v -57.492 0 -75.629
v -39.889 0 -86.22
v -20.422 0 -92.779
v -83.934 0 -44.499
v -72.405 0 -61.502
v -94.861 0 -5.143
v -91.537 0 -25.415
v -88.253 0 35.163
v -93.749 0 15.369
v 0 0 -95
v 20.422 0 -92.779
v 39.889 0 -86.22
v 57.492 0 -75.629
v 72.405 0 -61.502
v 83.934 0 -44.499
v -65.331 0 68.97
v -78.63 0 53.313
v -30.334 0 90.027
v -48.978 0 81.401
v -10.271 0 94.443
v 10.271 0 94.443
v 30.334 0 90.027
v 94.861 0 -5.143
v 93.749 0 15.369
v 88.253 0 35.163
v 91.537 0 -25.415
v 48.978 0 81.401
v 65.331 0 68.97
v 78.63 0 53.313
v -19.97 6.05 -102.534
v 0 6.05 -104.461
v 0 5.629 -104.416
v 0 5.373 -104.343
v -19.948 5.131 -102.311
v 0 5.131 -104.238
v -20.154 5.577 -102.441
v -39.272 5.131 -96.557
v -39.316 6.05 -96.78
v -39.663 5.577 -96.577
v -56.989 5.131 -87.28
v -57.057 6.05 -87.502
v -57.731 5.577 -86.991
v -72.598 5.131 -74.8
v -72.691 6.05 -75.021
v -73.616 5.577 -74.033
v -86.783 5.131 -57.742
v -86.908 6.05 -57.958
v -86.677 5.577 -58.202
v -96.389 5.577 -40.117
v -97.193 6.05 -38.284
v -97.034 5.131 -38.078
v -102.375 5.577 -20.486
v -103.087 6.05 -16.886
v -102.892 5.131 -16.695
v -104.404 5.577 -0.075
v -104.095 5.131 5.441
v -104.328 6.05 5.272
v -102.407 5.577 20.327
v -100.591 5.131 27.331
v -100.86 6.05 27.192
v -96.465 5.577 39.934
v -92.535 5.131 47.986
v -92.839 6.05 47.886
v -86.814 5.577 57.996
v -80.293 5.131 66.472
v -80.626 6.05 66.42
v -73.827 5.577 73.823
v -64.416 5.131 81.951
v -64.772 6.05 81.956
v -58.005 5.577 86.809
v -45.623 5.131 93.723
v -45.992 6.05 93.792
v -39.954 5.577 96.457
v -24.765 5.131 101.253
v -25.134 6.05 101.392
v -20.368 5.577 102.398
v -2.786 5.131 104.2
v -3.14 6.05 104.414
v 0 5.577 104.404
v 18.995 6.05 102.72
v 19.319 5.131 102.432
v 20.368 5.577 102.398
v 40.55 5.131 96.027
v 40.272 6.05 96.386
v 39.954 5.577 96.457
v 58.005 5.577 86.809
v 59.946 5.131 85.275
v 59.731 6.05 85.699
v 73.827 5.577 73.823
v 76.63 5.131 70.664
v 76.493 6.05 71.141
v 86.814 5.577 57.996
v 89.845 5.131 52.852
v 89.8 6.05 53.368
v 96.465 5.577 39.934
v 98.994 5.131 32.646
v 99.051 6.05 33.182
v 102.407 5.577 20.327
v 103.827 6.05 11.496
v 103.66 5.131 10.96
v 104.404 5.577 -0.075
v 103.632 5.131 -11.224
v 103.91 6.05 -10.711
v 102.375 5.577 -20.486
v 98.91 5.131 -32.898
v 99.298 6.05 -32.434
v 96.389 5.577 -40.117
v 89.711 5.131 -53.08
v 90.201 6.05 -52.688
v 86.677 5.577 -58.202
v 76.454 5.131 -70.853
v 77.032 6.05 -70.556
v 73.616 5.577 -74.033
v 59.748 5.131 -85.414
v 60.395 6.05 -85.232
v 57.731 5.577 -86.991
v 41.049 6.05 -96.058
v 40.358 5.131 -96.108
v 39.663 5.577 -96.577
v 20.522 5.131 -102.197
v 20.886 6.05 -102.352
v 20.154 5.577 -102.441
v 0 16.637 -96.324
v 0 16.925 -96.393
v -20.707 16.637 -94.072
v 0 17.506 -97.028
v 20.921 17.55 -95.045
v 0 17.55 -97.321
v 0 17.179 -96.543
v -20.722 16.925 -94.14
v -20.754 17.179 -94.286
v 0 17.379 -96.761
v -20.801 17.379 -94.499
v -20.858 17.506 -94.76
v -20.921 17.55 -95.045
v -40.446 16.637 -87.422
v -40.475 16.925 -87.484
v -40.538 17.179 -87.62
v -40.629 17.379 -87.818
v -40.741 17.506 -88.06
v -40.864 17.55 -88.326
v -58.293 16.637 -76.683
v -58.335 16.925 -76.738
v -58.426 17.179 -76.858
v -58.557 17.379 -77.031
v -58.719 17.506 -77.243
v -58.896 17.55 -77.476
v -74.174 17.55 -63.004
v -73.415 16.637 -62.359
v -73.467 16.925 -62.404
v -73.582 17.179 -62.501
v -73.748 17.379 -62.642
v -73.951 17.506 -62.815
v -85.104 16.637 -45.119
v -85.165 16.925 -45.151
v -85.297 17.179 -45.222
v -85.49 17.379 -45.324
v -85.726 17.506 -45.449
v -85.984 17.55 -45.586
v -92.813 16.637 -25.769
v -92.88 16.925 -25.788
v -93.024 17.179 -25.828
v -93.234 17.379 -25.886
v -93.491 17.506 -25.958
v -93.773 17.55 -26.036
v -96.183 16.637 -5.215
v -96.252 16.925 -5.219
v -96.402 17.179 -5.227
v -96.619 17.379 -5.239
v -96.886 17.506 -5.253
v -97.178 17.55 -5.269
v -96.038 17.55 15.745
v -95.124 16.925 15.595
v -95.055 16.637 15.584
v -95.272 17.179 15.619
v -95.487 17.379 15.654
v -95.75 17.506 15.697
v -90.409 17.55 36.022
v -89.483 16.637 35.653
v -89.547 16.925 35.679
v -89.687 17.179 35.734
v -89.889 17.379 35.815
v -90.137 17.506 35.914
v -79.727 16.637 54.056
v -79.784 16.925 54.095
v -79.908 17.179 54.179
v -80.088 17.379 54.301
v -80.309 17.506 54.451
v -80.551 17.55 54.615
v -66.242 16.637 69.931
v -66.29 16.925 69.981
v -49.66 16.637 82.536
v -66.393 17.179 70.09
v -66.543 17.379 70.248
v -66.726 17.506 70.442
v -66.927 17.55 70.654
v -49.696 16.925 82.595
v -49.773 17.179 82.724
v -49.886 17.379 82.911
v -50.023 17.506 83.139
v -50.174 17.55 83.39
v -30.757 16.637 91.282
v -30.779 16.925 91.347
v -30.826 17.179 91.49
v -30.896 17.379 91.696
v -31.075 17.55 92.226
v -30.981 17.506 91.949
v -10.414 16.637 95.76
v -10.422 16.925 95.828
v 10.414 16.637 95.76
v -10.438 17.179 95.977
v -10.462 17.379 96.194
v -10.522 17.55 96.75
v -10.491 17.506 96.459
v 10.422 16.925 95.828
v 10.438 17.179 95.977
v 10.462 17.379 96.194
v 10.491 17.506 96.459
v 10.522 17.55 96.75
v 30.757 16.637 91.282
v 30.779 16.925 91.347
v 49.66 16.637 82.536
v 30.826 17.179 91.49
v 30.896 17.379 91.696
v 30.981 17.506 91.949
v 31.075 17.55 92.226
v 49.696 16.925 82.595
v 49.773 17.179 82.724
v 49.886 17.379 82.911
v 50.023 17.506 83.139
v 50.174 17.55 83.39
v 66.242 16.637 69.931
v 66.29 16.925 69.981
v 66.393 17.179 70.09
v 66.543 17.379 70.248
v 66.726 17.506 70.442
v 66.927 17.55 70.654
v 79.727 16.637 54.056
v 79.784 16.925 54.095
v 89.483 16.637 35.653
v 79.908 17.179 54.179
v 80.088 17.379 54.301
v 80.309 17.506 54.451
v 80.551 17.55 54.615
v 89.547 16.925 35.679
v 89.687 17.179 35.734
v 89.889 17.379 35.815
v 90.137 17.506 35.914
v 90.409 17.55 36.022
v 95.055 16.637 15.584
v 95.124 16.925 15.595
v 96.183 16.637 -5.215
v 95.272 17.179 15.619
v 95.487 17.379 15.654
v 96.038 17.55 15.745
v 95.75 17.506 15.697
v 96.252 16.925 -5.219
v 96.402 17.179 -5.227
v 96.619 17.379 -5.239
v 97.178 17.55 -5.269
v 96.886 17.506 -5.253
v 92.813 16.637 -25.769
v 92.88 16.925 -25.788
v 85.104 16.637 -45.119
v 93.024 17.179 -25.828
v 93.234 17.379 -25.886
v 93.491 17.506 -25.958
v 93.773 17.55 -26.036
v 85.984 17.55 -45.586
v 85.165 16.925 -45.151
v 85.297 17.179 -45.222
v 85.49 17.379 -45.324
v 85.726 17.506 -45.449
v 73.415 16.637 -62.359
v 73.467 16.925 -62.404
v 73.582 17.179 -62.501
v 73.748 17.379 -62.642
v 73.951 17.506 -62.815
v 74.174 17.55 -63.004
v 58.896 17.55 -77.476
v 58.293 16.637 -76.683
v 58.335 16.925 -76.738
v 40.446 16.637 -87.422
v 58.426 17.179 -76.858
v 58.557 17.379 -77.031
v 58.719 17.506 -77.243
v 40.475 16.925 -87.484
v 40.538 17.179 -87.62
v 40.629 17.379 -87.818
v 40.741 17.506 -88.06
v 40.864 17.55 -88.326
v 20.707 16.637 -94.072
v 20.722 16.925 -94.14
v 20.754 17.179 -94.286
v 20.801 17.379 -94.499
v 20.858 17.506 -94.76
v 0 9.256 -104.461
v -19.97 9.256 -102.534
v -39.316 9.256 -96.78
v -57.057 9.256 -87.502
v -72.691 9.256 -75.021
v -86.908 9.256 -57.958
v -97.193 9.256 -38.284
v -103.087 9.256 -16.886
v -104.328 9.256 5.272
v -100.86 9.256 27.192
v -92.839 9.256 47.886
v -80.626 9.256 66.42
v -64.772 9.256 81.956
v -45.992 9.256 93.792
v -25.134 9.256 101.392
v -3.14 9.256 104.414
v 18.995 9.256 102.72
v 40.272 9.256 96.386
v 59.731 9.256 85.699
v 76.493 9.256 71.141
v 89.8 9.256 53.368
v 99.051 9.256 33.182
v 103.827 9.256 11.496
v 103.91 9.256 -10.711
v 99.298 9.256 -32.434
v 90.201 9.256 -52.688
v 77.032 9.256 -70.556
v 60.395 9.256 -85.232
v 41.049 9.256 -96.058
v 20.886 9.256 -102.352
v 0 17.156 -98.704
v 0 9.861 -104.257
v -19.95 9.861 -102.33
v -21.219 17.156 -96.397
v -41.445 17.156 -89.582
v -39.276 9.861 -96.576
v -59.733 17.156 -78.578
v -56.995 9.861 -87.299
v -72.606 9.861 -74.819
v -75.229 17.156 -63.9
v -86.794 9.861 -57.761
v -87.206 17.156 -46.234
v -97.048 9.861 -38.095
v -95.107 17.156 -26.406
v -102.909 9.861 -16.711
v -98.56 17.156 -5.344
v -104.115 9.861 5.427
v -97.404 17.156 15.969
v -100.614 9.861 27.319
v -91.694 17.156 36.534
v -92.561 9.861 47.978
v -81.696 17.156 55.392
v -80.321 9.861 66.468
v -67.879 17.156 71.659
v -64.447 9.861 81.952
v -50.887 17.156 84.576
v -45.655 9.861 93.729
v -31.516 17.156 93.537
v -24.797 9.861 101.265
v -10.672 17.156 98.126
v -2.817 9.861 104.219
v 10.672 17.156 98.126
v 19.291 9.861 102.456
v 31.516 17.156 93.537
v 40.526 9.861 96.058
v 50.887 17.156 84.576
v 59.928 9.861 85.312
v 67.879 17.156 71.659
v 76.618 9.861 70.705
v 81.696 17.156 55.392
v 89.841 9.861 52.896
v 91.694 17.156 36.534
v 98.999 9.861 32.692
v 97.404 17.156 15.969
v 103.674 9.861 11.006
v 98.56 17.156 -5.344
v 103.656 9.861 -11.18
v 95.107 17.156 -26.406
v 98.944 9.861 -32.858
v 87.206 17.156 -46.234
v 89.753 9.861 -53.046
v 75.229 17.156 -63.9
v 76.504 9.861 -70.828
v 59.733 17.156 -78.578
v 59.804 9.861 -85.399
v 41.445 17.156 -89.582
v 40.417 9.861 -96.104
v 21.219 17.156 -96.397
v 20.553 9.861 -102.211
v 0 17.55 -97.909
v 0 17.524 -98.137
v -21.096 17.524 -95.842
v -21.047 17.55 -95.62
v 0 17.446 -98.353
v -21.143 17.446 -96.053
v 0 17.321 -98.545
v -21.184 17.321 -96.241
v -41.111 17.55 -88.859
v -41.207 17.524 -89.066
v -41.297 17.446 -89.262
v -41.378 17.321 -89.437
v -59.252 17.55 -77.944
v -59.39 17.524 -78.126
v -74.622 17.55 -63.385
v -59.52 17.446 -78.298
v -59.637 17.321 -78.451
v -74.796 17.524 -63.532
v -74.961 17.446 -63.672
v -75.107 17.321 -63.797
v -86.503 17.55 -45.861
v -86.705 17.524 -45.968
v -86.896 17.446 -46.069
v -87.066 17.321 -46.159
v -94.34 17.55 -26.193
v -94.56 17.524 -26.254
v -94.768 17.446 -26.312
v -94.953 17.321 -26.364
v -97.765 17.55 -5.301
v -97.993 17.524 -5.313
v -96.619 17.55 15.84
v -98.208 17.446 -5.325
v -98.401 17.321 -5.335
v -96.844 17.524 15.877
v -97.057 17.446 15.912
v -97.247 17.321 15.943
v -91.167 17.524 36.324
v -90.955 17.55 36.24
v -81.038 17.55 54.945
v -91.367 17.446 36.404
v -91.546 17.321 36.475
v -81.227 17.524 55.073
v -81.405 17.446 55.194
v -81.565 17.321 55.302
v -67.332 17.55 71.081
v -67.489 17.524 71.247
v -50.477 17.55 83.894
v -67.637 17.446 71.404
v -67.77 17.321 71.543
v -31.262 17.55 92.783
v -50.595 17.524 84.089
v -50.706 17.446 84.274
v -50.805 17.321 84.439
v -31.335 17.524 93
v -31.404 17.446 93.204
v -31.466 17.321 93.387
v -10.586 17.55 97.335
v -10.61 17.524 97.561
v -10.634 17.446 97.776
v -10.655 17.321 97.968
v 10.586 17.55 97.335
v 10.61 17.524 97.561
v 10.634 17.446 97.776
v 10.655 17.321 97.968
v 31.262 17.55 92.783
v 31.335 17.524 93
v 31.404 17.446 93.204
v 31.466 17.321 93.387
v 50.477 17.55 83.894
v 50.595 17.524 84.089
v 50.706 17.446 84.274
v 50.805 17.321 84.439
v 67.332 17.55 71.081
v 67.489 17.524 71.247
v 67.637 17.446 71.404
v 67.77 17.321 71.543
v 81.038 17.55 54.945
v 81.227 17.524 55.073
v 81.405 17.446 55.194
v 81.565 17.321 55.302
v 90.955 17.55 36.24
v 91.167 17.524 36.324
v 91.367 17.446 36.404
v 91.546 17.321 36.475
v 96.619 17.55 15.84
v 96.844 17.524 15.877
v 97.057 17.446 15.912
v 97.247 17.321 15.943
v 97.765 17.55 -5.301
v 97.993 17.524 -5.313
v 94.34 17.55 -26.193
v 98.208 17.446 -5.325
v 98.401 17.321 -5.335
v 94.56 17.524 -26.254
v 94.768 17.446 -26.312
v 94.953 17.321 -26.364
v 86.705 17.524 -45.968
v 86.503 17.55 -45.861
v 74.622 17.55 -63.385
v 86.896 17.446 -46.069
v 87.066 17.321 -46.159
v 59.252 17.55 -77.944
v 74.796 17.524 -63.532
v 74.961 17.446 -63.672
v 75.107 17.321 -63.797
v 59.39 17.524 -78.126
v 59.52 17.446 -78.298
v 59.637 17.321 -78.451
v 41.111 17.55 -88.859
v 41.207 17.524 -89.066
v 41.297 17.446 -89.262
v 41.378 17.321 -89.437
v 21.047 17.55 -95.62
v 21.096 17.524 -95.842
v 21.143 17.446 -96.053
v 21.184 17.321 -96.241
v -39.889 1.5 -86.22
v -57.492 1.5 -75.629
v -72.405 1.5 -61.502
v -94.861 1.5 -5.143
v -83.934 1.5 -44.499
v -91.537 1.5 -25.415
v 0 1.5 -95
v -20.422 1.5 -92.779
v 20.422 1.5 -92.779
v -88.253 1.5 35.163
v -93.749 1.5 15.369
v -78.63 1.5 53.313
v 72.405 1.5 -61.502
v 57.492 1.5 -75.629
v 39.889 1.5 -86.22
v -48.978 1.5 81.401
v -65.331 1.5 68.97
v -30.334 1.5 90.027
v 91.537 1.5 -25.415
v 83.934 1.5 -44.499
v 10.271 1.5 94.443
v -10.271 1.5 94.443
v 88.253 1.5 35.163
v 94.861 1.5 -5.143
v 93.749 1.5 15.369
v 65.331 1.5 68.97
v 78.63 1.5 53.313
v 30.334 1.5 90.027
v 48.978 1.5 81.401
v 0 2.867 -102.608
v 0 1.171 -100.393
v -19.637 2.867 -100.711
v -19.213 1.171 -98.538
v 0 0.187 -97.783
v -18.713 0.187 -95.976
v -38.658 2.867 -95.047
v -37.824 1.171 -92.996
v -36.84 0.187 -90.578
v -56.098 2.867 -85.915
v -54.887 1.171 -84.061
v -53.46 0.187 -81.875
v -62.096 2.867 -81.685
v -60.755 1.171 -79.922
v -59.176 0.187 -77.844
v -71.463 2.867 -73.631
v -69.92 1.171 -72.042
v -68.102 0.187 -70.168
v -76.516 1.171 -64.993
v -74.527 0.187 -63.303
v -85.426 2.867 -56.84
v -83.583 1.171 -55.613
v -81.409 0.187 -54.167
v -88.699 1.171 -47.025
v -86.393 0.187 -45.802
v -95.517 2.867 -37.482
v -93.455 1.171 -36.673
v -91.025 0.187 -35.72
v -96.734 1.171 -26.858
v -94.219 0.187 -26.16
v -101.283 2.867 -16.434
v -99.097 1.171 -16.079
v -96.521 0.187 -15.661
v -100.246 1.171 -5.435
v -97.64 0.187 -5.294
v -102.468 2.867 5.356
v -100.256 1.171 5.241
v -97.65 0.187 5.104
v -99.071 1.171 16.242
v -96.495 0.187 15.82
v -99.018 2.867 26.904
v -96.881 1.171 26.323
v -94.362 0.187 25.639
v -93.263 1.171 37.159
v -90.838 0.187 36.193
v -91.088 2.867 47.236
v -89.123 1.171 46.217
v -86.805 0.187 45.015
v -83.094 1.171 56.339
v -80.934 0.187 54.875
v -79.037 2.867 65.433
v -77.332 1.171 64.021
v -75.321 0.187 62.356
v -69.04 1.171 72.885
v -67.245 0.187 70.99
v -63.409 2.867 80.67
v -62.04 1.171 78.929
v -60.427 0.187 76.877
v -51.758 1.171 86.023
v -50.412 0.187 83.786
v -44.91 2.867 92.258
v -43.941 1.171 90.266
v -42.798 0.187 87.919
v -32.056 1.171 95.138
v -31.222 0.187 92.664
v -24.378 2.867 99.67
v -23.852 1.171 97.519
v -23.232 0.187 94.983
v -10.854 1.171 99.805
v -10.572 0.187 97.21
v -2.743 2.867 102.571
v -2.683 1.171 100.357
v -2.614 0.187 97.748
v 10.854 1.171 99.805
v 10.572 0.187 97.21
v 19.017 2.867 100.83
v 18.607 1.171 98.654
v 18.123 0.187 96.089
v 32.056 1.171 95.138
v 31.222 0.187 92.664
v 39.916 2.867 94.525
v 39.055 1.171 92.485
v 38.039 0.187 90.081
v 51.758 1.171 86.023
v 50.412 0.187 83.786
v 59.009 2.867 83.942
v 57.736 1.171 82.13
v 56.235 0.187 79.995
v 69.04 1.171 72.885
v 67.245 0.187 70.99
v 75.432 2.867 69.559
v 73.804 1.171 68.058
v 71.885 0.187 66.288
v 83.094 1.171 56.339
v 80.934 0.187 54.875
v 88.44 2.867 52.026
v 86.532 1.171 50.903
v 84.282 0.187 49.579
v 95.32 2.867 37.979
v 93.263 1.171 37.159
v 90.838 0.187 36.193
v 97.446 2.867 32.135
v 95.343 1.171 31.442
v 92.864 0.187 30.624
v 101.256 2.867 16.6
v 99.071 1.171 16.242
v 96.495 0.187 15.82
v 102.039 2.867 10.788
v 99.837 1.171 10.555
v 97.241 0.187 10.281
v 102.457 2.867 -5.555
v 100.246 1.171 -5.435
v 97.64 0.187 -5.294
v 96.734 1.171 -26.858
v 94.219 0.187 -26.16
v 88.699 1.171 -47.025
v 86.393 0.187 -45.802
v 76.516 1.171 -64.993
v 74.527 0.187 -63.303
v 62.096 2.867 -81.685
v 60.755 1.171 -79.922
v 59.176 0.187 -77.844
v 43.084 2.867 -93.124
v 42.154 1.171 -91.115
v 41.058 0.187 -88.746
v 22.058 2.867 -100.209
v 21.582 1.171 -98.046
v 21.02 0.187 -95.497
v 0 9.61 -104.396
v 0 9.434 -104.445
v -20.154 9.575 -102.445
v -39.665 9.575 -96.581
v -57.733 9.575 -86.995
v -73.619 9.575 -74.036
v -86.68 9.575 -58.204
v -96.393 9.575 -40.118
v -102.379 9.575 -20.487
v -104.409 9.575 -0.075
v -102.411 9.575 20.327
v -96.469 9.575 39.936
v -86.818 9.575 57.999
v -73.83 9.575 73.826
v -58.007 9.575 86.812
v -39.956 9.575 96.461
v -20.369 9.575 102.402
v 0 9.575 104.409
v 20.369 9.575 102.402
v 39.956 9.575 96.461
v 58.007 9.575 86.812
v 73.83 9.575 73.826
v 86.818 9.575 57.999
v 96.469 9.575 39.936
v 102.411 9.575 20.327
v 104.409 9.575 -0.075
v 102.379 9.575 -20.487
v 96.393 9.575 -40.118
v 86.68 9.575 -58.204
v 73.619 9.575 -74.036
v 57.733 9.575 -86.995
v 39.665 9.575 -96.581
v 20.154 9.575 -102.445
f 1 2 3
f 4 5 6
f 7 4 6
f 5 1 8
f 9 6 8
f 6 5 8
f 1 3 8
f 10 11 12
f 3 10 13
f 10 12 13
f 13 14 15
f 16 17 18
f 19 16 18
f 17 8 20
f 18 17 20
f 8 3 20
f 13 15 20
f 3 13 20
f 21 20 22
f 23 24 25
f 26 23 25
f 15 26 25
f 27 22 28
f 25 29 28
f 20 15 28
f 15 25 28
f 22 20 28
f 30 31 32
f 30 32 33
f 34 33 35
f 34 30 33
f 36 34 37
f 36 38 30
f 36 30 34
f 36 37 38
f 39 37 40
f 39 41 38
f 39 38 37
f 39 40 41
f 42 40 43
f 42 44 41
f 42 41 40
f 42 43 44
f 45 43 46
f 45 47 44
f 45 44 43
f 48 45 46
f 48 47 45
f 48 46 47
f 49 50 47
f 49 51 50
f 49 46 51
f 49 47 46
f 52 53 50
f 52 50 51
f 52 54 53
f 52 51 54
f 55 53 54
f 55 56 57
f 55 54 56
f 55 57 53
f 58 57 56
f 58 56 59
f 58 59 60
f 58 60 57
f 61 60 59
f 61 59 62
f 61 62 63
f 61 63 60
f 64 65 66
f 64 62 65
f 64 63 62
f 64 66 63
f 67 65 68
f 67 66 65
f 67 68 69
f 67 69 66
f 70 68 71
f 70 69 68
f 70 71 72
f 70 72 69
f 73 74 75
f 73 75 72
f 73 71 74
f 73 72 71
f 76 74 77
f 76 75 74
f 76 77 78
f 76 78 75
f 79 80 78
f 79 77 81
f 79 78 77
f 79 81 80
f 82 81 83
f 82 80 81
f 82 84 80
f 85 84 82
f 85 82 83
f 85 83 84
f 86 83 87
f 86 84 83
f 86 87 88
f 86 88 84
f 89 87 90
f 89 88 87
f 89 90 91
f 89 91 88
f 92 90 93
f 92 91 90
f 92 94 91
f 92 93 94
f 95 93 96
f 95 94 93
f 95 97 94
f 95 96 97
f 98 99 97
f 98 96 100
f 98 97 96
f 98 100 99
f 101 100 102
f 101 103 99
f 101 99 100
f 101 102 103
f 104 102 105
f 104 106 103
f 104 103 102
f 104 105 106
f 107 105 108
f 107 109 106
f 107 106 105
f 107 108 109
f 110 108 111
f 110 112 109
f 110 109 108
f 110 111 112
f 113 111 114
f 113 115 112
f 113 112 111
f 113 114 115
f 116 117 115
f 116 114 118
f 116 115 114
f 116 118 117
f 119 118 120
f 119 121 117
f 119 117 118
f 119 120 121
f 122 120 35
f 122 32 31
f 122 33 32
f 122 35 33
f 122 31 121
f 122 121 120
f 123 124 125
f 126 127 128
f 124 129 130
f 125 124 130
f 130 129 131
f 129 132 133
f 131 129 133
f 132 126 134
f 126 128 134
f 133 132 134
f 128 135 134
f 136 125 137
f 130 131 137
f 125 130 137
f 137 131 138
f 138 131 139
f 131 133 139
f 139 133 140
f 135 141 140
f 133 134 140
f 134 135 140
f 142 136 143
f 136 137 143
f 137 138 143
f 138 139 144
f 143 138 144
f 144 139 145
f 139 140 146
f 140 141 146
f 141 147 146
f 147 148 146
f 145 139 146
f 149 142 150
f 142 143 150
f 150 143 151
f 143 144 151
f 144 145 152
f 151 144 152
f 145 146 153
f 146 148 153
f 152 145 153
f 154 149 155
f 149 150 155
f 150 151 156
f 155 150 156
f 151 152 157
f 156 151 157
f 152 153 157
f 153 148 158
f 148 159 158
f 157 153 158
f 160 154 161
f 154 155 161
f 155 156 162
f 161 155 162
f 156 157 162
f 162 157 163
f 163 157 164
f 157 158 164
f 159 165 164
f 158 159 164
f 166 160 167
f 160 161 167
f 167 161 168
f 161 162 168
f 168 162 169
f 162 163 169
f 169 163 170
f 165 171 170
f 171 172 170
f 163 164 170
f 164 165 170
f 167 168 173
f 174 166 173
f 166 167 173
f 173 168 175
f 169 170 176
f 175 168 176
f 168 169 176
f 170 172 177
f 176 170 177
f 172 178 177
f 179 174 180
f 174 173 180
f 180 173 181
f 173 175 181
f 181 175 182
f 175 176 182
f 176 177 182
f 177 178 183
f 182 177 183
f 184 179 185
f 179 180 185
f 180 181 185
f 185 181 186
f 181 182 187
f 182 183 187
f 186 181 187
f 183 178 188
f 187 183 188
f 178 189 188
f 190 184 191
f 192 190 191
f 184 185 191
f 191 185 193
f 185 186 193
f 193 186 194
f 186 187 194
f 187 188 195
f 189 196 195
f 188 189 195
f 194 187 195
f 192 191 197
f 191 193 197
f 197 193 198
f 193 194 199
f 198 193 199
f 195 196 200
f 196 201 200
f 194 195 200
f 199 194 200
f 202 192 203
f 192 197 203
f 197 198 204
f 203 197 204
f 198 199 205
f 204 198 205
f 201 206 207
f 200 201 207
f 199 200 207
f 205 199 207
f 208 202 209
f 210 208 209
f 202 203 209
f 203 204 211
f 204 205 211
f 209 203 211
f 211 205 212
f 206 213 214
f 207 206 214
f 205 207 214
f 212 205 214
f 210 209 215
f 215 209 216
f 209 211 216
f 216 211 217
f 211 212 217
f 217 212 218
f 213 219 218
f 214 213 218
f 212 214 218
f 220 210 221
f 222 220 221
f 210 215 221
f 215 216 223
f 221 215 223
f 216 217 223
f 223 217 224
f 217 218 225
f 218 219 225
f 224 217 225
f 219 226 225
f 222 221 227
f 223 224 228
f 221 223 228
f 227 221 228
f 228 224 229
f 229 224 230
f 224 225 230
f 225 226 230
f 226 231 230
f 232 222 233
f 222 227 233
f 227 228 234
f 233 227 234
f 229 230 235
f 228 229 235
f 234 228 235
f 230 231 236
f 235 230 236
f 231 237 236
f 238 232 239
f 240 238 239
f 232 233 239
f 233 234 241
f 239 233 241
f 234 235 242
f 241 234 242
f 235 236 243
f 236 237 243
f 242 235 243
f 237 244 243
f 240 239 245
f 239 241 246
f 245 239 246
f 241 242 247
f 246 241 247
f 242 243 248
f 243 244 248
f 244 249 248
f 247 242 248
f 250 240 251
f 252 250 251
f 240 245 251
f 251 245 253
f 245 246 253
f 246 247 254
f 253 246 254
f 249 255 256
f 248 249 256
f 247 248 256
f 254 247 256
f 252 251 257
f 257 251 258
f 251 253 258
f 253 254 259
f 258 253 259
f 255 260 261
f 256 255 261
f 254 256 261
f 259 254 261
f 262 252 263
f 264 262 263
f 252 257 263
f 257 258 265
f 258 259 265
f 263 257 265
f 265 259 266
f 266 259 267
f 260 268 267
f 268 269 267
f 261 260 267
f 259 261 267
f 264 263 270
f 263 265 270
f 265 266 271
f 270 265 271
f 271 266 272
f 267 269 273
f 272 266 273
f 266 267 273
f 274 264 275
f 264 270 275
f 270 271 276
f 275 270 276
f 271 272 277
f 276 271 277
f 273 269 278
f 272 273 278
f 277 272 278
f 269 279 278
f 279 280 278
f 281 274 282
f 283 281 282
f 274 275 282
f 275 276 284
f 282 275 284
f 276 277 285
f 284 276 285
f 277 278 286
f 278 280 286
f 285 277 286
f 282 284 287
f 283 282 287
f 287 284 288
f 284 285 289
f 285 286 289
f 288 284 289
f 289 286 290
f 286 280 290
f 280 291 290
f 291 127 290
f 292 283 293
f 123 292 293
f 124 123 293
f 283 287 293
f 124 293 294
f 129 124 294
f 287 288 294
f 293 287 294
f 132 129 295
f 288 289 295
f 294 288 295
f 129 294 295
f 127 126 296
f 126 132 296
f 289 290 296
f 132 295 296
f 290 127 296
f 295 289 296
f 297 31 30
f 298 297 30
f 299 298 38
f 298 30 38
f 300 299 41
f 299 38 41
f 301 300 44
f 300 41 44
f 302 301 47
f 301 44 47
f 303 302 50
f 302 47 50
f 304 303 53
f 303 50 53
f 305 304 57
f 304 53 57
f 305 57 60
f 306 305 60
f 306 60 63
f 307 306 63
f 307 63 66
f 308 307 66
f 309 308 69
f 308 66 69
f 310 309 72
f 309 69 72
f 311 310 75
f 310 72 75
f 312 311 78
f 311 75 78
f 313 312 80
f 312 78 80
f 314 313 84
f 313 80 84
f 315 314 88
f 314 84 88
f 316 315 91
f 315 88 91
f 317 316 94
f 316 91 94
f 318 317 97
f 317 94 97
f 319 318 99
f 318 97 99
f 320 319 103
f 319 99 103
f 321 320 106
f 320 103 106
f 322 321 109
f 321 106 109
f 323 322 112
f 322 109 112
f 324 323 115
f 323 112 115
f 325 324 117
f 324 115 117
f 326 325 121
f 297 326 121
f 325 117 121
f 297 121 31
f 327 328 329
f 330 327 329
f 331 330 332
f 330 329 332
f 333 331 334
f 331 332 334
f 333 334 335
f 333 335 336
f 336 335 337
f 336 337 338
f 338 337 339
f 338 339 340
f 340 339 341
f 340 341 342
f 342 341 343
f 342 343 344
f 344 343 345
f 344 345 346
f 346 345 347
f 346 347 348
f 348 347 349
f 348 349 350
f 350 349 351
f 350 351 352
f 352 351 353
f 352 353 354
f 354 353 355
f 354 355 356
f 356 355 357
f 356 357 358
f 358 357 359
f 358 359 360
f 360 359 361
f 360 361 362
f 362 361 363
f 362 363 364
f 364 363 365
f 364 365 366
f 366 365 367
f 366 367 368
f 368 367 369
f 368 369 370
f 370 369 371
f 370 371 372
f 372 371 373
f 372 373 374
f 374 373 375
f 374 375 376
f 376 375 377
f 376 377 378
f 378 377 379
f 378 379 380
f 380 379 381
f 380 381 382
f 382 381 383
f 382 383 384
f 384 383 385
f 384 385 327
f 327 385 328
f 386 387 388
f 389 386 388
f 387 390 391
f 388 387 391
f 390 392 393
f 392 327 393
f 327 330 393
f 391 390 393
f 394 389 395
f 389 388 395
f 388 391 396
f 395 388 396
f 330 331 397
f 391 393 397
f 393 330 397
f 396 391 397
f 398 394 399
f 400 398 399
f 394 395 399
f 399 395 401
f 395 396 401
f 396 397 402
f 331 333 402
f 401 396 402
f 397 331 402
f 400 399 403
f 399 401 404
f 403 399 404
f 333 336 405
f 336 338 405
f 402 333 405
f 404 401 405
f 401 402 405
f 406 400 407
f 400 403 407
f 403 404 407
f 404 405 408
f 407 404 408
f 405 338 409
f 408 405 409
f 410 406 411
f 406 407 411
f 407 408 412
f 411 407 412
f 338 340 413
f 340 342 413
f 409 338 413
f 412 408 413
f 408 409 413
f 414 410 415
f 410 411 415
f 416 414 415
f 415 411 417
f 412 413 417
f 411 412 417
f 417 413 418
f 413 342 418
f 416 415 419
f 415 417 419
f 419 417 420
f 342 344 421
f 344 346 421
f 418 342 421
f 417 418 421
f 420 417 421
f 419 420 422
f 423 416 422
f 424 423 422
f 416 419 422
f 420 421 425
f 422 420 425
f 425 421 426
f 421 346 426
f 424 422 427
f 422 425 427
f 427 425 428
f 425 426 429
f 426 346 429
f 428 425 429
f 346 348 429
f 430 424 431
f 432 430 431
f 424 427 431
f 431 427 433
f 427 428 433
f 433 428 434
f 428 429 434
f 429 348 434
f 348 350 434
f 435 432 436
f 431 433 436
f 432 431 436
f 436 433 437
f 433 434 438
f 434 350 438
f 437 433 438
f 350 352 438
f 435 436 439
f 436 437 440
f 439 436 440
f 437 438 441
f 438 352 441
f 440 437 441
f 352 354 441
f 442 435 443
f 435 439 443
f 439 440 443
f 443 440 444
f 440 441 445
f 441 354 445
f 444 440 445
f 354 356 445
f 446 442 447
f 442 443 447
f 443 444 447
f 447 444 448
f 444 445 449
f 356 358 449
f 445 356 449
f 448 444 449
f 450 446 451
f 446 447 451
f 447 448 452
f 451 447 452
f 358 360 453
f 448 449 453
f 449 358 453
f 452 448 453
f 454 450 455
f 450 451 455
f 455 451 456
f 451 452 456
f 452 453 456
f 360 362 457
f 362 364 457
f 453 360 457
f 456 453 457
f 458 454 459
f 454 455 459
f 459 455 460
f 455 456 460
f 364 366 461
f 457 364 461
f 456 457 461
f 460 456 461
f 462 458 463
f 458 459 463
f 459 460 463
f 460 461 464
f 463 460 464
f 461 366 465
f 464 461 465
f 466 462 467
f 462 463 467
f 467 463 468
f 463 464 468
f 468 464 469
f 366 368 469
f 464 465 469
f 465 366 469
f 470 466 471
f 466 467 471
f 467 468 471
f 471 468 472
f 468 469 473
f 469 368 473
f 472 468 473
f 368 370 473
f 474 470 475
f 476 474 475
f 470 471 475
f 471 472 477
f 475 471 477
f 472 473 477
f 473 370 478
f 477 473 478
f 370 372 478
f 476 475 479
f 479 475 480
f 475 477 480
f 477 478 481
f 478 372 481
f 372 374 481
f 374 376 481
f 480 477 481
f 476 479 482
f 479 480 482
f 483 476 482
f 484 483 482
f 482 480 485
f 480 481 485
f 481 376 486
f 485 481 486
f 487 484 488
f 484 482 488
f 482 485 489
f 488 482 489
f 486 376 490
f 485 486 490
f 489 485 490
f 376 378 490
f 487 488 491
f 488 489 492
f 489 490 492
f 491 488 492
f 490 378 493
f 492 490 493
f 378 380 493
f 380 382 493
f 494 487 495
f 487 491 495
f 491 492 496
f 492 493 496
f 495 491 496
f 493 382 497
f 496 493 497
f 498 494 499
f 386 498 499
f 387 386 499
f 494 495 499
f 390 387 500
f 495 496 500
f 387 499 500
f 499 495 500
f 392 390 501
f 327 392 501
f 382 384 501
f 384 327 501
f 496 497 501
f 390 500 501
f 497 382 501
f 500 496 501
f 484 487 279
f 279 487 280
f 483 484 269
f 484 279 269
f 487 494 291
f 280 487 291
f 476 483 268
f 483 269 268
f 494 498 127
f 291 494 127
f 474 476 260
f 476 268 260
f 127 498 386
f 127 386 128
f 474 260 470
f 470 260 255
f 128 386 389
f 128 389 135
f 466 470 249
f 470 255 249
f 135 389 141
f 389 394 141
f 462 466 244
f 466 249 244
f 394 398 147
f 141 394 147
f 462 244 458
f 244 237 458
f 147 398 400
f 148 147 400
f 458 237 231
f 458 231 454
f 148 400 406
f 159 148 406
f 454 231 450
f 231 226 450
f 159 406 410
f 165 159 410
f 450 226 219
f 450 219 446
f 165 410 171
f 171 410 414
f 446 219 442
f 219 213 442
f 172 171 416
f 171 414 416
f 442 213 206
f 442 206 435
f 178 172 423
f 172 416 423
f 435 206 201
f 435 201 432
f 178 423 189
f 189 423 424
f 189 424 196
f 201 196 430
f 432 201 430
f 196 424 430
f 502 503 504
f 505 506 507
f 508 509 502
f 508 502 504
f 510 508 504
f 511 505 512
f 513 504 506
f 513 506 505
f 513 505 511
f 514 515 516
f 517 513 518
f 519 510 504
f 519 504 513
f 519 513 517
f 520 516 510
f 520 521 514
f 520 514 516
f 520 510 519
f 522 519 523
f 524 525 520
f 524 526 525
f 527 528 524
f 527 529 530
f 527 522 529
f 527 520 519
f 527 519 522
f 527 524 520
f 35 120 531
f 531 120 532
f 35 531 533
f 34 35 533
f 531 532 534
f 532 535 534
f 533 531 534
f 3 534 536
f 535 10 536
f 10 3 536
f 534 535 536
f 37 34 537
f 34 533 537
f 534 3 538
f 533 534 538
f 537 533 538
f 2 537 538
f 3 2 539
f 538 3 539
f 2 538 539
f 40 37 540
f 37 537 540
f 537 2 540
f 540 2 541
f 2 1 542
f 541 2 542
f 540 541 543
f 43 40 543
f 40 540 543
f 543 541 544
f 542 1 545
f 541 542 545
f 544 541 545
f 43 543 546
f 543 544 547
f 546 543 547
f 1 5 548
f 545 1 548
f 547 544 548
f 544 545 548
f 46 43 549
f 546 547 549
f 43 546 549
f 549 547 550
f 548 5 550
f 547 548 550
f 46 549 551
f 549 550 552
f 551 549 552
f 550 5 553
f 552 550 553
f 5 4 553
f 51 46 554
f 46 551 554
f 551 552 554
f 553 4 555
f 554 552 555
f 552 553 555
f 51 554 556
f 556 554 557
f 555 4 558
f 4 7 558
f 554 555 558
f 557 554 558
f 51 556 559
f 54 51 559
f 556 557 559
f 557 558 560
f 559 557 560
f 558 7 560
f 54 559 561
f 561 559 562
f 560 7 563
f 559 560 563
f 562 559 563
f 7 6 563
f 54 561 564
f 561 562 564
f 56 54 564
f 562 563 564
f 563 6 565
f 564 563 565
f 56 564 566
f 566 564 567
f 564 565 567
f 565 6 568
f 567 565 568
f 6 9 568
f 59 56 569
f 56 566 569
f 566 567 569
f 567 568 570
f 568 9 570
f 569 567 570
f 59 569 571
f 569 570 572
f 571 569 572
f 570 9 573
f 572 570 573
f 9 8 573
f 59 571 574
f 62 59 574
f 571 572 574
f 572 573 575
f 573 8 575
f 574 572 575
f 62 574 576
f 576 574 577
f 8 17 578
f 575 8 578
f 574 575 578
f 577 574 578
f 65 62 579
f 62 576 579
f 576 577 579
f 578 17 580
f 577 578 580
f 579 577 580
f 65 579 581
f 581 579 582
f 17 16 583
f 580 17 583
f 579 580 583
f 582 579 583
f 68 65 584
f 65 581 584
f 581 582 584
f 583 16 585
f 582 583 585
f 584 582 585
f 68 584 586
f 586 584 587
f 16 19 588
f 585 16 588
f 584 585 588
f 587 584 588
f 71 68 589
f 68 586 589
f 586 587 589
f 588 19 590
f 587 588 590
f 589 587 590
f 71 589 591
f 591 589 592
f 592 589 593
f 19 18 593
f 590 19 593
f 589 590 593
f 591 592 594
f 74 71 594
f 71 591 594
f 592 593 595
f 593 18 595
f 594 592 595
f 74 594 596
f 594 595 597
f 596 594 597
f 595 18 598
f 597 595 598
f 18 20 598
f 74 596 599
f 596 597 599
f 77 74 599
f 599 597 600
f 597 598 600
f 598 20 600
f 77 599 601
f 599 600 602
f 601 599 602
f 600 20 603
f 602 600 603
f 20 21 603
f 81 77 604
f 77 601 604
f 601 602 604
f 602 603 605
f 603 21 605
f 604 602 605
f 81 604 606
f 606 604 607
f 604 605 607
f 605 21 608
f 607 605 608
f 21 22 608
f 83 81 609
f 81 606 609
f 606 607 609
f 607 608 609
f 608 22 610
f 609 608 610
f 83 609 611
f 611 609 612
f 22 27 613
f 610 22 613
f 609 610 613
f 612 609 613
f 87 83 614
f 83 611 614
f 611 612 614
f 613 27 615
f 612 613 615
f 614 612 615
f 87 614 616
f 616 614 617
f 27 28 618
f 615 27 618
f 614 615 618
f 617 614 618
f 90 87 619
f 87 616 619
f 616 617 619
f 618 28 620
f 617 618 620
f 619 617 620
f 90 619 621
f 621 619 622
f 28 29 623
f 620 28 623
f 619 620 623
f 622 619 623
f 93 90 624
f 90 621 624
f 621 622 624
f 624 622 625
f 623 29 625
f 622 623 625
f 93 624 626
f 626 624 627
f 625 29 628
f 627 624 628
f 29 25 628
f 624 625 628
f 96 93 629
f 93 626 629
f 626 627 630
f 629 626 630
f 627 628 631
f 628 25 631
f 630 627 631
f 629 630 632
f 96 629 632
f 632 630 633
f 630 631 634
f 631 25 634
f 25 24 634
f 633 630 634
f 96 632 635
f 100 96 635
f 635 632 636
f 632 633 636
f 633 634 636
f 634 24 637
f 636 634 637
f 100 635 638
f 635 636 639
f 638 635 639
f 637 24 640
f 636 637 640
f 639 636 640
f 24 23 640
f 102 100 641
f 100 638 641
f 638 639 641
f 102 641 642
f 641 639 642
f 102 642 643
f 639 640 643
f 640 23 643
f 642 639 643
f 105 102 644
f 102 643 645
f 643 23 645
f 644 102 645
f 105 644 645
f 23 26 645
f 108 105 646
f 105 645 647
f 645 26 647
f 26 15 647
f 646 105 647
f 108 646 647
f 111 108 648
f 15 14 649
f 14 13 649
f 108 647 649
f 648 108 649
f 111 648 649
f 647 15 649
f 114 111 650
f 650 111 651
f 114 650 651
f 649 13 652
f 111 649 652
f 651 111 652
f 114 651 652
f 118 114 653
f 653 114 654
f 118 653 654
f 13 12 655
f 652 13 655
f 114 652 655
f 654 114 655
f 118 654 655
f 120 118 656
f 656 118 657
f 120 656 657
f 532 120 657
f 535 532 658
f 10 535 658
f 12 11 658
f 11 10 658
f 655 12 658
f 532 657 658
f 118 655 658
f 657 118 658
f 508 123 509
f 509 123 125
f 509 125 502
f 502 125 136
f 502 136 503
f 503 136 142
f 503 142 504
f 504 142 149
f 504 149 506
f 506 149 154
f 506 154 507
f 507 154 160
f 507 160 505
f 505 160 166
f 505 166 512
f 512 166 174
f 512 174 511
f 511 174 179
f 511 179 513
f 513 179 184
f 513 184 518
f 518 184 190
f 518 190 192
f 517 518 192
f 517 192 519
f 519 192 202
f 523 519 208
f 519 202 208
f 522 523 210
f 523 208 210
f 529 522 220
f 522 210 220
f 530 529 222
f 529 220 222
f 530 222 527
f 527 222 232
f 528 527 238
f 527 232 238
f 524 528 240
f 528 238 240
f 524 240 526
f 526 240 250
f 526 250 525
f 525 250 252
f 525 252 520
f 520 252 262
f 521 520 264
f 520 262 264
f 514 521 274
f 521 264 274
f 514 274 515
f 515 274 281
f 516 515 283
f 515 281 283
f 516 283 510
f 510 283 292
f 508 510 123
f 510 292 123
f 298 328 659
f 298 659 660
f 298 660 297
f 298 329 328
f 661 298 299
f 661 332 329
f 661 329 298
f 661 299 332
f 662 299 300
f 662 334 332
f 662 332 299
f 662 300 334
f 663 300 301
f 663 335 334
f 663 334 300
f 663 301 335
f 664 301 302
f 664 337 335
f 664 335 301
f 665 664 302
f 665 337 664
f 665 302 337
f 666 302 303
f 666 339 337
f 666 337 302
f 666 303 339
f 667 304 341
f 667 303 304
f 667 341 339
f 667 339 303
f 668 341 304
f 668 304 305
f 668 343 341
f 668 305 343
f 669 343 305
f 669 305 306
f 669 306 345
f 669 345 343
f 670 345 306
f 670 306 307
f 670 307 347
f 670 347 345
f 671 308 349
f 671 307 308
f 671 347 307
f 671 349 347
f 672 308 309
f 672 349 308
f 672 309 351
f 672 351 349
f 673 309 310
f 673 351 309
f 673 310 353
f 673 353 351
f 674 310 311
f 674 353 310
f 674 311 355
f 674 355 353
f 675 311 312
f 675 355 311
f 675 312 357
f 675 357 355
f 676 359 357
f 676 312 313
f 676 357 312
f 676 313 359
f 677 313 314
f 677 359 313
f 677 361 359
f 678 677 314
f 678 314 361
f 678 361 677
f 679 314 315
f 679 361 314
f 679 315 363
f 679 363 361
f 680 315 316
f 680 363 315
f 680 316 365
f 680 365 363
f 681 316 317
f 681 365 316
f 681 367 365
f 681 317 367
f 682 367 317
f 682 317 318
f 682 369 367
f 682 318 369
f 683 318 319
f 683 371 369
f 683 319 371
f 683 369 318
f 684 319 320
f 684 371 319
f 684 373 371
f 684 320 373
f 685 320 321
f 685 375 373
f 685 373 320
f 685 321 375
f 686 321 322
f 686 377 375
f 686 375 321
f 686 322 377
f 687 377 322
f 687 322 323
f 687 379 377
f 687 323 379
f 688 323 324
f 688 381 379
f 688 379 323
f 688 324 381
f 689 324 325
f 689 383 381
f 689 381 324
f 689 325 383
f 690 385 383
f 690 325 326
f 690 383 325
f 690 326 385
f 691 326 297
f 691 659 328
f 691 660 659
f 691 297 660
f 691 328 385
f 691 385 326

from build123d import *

# Parameters (mm, degrees)
SKETCH1_R           = 95
BOSS_EXTRUDE1_DEPTH = 1.5
FILLET1_R           = 1
FILLET2_R           = 1
FILLET4_R           = 2


with BuildPart() as part:
    # Sketch1 → Boss-Extrude1 (new body)
    with BuildSketch(Plane(origin=(0, 0, 0), x_dir=(1, 0, 0), z_dir=(0, 1, 0))):
        with Locations(Location((0, 0, 0), (0, 0, 270))):
            Circle(SKETCH1_R)
    extrude(amount=BOSS_EXTRUDE1_DEPTH)

    # Sketch2 → Revolve1 (revolve)
    with BuildSketch(Plane.XY, mode=Mode.PRIVATE) as revolve1_sk:
        with BuildLine():
            Line((95, 1.5), (96.40419305, 17.55))
            Line((96.40419305, 17.55), (98.40419305, 17.55))
            Line((98.40419305, 17.55), (104.461103858, 9.593001102))
            Line((104.461103858, 9.593001102), (104.461103858, 5.593001102))
            ThreePointArc((104.461103858, 5.593001102), (100.616111366, 1.298490869), (95, 0))
            Line((95, 0), (95, 1.5))
        make_face()
    revolve(revolve1_sk.sketch.rotate(Axis((0, 0, 0), (0, 1, 0)), 90), axis=Axis((0, 0, 0), (0, 1, 0)))

    # Fillet1
    fillet1_edges = [part.edges().sort_by_distance(p)[0] for p in [
        (0, 17.55, 98.40419305),
        (0, 17.55, 96.40419305),
    ]]
    fillet(fillet1_edges, radius=FILLET1_R)

    # Fillet2
    fillet2_edges = [part.edges().sort_by_distance(p)[0] for p in [
        (0, 9.593001102, 104.461103858),
    ]]
    fillet(fillet2_edges, radius=FILLET2_R)

    # Fillet4
    fillet4_edges = [part.edges().sort_by_distance(p)[0] for p in [
        (0, 5.593001102, 104.461103858),
    ]]
    fillet(fillet4_edges, radius=FILLET4_R)


solid = part.part
